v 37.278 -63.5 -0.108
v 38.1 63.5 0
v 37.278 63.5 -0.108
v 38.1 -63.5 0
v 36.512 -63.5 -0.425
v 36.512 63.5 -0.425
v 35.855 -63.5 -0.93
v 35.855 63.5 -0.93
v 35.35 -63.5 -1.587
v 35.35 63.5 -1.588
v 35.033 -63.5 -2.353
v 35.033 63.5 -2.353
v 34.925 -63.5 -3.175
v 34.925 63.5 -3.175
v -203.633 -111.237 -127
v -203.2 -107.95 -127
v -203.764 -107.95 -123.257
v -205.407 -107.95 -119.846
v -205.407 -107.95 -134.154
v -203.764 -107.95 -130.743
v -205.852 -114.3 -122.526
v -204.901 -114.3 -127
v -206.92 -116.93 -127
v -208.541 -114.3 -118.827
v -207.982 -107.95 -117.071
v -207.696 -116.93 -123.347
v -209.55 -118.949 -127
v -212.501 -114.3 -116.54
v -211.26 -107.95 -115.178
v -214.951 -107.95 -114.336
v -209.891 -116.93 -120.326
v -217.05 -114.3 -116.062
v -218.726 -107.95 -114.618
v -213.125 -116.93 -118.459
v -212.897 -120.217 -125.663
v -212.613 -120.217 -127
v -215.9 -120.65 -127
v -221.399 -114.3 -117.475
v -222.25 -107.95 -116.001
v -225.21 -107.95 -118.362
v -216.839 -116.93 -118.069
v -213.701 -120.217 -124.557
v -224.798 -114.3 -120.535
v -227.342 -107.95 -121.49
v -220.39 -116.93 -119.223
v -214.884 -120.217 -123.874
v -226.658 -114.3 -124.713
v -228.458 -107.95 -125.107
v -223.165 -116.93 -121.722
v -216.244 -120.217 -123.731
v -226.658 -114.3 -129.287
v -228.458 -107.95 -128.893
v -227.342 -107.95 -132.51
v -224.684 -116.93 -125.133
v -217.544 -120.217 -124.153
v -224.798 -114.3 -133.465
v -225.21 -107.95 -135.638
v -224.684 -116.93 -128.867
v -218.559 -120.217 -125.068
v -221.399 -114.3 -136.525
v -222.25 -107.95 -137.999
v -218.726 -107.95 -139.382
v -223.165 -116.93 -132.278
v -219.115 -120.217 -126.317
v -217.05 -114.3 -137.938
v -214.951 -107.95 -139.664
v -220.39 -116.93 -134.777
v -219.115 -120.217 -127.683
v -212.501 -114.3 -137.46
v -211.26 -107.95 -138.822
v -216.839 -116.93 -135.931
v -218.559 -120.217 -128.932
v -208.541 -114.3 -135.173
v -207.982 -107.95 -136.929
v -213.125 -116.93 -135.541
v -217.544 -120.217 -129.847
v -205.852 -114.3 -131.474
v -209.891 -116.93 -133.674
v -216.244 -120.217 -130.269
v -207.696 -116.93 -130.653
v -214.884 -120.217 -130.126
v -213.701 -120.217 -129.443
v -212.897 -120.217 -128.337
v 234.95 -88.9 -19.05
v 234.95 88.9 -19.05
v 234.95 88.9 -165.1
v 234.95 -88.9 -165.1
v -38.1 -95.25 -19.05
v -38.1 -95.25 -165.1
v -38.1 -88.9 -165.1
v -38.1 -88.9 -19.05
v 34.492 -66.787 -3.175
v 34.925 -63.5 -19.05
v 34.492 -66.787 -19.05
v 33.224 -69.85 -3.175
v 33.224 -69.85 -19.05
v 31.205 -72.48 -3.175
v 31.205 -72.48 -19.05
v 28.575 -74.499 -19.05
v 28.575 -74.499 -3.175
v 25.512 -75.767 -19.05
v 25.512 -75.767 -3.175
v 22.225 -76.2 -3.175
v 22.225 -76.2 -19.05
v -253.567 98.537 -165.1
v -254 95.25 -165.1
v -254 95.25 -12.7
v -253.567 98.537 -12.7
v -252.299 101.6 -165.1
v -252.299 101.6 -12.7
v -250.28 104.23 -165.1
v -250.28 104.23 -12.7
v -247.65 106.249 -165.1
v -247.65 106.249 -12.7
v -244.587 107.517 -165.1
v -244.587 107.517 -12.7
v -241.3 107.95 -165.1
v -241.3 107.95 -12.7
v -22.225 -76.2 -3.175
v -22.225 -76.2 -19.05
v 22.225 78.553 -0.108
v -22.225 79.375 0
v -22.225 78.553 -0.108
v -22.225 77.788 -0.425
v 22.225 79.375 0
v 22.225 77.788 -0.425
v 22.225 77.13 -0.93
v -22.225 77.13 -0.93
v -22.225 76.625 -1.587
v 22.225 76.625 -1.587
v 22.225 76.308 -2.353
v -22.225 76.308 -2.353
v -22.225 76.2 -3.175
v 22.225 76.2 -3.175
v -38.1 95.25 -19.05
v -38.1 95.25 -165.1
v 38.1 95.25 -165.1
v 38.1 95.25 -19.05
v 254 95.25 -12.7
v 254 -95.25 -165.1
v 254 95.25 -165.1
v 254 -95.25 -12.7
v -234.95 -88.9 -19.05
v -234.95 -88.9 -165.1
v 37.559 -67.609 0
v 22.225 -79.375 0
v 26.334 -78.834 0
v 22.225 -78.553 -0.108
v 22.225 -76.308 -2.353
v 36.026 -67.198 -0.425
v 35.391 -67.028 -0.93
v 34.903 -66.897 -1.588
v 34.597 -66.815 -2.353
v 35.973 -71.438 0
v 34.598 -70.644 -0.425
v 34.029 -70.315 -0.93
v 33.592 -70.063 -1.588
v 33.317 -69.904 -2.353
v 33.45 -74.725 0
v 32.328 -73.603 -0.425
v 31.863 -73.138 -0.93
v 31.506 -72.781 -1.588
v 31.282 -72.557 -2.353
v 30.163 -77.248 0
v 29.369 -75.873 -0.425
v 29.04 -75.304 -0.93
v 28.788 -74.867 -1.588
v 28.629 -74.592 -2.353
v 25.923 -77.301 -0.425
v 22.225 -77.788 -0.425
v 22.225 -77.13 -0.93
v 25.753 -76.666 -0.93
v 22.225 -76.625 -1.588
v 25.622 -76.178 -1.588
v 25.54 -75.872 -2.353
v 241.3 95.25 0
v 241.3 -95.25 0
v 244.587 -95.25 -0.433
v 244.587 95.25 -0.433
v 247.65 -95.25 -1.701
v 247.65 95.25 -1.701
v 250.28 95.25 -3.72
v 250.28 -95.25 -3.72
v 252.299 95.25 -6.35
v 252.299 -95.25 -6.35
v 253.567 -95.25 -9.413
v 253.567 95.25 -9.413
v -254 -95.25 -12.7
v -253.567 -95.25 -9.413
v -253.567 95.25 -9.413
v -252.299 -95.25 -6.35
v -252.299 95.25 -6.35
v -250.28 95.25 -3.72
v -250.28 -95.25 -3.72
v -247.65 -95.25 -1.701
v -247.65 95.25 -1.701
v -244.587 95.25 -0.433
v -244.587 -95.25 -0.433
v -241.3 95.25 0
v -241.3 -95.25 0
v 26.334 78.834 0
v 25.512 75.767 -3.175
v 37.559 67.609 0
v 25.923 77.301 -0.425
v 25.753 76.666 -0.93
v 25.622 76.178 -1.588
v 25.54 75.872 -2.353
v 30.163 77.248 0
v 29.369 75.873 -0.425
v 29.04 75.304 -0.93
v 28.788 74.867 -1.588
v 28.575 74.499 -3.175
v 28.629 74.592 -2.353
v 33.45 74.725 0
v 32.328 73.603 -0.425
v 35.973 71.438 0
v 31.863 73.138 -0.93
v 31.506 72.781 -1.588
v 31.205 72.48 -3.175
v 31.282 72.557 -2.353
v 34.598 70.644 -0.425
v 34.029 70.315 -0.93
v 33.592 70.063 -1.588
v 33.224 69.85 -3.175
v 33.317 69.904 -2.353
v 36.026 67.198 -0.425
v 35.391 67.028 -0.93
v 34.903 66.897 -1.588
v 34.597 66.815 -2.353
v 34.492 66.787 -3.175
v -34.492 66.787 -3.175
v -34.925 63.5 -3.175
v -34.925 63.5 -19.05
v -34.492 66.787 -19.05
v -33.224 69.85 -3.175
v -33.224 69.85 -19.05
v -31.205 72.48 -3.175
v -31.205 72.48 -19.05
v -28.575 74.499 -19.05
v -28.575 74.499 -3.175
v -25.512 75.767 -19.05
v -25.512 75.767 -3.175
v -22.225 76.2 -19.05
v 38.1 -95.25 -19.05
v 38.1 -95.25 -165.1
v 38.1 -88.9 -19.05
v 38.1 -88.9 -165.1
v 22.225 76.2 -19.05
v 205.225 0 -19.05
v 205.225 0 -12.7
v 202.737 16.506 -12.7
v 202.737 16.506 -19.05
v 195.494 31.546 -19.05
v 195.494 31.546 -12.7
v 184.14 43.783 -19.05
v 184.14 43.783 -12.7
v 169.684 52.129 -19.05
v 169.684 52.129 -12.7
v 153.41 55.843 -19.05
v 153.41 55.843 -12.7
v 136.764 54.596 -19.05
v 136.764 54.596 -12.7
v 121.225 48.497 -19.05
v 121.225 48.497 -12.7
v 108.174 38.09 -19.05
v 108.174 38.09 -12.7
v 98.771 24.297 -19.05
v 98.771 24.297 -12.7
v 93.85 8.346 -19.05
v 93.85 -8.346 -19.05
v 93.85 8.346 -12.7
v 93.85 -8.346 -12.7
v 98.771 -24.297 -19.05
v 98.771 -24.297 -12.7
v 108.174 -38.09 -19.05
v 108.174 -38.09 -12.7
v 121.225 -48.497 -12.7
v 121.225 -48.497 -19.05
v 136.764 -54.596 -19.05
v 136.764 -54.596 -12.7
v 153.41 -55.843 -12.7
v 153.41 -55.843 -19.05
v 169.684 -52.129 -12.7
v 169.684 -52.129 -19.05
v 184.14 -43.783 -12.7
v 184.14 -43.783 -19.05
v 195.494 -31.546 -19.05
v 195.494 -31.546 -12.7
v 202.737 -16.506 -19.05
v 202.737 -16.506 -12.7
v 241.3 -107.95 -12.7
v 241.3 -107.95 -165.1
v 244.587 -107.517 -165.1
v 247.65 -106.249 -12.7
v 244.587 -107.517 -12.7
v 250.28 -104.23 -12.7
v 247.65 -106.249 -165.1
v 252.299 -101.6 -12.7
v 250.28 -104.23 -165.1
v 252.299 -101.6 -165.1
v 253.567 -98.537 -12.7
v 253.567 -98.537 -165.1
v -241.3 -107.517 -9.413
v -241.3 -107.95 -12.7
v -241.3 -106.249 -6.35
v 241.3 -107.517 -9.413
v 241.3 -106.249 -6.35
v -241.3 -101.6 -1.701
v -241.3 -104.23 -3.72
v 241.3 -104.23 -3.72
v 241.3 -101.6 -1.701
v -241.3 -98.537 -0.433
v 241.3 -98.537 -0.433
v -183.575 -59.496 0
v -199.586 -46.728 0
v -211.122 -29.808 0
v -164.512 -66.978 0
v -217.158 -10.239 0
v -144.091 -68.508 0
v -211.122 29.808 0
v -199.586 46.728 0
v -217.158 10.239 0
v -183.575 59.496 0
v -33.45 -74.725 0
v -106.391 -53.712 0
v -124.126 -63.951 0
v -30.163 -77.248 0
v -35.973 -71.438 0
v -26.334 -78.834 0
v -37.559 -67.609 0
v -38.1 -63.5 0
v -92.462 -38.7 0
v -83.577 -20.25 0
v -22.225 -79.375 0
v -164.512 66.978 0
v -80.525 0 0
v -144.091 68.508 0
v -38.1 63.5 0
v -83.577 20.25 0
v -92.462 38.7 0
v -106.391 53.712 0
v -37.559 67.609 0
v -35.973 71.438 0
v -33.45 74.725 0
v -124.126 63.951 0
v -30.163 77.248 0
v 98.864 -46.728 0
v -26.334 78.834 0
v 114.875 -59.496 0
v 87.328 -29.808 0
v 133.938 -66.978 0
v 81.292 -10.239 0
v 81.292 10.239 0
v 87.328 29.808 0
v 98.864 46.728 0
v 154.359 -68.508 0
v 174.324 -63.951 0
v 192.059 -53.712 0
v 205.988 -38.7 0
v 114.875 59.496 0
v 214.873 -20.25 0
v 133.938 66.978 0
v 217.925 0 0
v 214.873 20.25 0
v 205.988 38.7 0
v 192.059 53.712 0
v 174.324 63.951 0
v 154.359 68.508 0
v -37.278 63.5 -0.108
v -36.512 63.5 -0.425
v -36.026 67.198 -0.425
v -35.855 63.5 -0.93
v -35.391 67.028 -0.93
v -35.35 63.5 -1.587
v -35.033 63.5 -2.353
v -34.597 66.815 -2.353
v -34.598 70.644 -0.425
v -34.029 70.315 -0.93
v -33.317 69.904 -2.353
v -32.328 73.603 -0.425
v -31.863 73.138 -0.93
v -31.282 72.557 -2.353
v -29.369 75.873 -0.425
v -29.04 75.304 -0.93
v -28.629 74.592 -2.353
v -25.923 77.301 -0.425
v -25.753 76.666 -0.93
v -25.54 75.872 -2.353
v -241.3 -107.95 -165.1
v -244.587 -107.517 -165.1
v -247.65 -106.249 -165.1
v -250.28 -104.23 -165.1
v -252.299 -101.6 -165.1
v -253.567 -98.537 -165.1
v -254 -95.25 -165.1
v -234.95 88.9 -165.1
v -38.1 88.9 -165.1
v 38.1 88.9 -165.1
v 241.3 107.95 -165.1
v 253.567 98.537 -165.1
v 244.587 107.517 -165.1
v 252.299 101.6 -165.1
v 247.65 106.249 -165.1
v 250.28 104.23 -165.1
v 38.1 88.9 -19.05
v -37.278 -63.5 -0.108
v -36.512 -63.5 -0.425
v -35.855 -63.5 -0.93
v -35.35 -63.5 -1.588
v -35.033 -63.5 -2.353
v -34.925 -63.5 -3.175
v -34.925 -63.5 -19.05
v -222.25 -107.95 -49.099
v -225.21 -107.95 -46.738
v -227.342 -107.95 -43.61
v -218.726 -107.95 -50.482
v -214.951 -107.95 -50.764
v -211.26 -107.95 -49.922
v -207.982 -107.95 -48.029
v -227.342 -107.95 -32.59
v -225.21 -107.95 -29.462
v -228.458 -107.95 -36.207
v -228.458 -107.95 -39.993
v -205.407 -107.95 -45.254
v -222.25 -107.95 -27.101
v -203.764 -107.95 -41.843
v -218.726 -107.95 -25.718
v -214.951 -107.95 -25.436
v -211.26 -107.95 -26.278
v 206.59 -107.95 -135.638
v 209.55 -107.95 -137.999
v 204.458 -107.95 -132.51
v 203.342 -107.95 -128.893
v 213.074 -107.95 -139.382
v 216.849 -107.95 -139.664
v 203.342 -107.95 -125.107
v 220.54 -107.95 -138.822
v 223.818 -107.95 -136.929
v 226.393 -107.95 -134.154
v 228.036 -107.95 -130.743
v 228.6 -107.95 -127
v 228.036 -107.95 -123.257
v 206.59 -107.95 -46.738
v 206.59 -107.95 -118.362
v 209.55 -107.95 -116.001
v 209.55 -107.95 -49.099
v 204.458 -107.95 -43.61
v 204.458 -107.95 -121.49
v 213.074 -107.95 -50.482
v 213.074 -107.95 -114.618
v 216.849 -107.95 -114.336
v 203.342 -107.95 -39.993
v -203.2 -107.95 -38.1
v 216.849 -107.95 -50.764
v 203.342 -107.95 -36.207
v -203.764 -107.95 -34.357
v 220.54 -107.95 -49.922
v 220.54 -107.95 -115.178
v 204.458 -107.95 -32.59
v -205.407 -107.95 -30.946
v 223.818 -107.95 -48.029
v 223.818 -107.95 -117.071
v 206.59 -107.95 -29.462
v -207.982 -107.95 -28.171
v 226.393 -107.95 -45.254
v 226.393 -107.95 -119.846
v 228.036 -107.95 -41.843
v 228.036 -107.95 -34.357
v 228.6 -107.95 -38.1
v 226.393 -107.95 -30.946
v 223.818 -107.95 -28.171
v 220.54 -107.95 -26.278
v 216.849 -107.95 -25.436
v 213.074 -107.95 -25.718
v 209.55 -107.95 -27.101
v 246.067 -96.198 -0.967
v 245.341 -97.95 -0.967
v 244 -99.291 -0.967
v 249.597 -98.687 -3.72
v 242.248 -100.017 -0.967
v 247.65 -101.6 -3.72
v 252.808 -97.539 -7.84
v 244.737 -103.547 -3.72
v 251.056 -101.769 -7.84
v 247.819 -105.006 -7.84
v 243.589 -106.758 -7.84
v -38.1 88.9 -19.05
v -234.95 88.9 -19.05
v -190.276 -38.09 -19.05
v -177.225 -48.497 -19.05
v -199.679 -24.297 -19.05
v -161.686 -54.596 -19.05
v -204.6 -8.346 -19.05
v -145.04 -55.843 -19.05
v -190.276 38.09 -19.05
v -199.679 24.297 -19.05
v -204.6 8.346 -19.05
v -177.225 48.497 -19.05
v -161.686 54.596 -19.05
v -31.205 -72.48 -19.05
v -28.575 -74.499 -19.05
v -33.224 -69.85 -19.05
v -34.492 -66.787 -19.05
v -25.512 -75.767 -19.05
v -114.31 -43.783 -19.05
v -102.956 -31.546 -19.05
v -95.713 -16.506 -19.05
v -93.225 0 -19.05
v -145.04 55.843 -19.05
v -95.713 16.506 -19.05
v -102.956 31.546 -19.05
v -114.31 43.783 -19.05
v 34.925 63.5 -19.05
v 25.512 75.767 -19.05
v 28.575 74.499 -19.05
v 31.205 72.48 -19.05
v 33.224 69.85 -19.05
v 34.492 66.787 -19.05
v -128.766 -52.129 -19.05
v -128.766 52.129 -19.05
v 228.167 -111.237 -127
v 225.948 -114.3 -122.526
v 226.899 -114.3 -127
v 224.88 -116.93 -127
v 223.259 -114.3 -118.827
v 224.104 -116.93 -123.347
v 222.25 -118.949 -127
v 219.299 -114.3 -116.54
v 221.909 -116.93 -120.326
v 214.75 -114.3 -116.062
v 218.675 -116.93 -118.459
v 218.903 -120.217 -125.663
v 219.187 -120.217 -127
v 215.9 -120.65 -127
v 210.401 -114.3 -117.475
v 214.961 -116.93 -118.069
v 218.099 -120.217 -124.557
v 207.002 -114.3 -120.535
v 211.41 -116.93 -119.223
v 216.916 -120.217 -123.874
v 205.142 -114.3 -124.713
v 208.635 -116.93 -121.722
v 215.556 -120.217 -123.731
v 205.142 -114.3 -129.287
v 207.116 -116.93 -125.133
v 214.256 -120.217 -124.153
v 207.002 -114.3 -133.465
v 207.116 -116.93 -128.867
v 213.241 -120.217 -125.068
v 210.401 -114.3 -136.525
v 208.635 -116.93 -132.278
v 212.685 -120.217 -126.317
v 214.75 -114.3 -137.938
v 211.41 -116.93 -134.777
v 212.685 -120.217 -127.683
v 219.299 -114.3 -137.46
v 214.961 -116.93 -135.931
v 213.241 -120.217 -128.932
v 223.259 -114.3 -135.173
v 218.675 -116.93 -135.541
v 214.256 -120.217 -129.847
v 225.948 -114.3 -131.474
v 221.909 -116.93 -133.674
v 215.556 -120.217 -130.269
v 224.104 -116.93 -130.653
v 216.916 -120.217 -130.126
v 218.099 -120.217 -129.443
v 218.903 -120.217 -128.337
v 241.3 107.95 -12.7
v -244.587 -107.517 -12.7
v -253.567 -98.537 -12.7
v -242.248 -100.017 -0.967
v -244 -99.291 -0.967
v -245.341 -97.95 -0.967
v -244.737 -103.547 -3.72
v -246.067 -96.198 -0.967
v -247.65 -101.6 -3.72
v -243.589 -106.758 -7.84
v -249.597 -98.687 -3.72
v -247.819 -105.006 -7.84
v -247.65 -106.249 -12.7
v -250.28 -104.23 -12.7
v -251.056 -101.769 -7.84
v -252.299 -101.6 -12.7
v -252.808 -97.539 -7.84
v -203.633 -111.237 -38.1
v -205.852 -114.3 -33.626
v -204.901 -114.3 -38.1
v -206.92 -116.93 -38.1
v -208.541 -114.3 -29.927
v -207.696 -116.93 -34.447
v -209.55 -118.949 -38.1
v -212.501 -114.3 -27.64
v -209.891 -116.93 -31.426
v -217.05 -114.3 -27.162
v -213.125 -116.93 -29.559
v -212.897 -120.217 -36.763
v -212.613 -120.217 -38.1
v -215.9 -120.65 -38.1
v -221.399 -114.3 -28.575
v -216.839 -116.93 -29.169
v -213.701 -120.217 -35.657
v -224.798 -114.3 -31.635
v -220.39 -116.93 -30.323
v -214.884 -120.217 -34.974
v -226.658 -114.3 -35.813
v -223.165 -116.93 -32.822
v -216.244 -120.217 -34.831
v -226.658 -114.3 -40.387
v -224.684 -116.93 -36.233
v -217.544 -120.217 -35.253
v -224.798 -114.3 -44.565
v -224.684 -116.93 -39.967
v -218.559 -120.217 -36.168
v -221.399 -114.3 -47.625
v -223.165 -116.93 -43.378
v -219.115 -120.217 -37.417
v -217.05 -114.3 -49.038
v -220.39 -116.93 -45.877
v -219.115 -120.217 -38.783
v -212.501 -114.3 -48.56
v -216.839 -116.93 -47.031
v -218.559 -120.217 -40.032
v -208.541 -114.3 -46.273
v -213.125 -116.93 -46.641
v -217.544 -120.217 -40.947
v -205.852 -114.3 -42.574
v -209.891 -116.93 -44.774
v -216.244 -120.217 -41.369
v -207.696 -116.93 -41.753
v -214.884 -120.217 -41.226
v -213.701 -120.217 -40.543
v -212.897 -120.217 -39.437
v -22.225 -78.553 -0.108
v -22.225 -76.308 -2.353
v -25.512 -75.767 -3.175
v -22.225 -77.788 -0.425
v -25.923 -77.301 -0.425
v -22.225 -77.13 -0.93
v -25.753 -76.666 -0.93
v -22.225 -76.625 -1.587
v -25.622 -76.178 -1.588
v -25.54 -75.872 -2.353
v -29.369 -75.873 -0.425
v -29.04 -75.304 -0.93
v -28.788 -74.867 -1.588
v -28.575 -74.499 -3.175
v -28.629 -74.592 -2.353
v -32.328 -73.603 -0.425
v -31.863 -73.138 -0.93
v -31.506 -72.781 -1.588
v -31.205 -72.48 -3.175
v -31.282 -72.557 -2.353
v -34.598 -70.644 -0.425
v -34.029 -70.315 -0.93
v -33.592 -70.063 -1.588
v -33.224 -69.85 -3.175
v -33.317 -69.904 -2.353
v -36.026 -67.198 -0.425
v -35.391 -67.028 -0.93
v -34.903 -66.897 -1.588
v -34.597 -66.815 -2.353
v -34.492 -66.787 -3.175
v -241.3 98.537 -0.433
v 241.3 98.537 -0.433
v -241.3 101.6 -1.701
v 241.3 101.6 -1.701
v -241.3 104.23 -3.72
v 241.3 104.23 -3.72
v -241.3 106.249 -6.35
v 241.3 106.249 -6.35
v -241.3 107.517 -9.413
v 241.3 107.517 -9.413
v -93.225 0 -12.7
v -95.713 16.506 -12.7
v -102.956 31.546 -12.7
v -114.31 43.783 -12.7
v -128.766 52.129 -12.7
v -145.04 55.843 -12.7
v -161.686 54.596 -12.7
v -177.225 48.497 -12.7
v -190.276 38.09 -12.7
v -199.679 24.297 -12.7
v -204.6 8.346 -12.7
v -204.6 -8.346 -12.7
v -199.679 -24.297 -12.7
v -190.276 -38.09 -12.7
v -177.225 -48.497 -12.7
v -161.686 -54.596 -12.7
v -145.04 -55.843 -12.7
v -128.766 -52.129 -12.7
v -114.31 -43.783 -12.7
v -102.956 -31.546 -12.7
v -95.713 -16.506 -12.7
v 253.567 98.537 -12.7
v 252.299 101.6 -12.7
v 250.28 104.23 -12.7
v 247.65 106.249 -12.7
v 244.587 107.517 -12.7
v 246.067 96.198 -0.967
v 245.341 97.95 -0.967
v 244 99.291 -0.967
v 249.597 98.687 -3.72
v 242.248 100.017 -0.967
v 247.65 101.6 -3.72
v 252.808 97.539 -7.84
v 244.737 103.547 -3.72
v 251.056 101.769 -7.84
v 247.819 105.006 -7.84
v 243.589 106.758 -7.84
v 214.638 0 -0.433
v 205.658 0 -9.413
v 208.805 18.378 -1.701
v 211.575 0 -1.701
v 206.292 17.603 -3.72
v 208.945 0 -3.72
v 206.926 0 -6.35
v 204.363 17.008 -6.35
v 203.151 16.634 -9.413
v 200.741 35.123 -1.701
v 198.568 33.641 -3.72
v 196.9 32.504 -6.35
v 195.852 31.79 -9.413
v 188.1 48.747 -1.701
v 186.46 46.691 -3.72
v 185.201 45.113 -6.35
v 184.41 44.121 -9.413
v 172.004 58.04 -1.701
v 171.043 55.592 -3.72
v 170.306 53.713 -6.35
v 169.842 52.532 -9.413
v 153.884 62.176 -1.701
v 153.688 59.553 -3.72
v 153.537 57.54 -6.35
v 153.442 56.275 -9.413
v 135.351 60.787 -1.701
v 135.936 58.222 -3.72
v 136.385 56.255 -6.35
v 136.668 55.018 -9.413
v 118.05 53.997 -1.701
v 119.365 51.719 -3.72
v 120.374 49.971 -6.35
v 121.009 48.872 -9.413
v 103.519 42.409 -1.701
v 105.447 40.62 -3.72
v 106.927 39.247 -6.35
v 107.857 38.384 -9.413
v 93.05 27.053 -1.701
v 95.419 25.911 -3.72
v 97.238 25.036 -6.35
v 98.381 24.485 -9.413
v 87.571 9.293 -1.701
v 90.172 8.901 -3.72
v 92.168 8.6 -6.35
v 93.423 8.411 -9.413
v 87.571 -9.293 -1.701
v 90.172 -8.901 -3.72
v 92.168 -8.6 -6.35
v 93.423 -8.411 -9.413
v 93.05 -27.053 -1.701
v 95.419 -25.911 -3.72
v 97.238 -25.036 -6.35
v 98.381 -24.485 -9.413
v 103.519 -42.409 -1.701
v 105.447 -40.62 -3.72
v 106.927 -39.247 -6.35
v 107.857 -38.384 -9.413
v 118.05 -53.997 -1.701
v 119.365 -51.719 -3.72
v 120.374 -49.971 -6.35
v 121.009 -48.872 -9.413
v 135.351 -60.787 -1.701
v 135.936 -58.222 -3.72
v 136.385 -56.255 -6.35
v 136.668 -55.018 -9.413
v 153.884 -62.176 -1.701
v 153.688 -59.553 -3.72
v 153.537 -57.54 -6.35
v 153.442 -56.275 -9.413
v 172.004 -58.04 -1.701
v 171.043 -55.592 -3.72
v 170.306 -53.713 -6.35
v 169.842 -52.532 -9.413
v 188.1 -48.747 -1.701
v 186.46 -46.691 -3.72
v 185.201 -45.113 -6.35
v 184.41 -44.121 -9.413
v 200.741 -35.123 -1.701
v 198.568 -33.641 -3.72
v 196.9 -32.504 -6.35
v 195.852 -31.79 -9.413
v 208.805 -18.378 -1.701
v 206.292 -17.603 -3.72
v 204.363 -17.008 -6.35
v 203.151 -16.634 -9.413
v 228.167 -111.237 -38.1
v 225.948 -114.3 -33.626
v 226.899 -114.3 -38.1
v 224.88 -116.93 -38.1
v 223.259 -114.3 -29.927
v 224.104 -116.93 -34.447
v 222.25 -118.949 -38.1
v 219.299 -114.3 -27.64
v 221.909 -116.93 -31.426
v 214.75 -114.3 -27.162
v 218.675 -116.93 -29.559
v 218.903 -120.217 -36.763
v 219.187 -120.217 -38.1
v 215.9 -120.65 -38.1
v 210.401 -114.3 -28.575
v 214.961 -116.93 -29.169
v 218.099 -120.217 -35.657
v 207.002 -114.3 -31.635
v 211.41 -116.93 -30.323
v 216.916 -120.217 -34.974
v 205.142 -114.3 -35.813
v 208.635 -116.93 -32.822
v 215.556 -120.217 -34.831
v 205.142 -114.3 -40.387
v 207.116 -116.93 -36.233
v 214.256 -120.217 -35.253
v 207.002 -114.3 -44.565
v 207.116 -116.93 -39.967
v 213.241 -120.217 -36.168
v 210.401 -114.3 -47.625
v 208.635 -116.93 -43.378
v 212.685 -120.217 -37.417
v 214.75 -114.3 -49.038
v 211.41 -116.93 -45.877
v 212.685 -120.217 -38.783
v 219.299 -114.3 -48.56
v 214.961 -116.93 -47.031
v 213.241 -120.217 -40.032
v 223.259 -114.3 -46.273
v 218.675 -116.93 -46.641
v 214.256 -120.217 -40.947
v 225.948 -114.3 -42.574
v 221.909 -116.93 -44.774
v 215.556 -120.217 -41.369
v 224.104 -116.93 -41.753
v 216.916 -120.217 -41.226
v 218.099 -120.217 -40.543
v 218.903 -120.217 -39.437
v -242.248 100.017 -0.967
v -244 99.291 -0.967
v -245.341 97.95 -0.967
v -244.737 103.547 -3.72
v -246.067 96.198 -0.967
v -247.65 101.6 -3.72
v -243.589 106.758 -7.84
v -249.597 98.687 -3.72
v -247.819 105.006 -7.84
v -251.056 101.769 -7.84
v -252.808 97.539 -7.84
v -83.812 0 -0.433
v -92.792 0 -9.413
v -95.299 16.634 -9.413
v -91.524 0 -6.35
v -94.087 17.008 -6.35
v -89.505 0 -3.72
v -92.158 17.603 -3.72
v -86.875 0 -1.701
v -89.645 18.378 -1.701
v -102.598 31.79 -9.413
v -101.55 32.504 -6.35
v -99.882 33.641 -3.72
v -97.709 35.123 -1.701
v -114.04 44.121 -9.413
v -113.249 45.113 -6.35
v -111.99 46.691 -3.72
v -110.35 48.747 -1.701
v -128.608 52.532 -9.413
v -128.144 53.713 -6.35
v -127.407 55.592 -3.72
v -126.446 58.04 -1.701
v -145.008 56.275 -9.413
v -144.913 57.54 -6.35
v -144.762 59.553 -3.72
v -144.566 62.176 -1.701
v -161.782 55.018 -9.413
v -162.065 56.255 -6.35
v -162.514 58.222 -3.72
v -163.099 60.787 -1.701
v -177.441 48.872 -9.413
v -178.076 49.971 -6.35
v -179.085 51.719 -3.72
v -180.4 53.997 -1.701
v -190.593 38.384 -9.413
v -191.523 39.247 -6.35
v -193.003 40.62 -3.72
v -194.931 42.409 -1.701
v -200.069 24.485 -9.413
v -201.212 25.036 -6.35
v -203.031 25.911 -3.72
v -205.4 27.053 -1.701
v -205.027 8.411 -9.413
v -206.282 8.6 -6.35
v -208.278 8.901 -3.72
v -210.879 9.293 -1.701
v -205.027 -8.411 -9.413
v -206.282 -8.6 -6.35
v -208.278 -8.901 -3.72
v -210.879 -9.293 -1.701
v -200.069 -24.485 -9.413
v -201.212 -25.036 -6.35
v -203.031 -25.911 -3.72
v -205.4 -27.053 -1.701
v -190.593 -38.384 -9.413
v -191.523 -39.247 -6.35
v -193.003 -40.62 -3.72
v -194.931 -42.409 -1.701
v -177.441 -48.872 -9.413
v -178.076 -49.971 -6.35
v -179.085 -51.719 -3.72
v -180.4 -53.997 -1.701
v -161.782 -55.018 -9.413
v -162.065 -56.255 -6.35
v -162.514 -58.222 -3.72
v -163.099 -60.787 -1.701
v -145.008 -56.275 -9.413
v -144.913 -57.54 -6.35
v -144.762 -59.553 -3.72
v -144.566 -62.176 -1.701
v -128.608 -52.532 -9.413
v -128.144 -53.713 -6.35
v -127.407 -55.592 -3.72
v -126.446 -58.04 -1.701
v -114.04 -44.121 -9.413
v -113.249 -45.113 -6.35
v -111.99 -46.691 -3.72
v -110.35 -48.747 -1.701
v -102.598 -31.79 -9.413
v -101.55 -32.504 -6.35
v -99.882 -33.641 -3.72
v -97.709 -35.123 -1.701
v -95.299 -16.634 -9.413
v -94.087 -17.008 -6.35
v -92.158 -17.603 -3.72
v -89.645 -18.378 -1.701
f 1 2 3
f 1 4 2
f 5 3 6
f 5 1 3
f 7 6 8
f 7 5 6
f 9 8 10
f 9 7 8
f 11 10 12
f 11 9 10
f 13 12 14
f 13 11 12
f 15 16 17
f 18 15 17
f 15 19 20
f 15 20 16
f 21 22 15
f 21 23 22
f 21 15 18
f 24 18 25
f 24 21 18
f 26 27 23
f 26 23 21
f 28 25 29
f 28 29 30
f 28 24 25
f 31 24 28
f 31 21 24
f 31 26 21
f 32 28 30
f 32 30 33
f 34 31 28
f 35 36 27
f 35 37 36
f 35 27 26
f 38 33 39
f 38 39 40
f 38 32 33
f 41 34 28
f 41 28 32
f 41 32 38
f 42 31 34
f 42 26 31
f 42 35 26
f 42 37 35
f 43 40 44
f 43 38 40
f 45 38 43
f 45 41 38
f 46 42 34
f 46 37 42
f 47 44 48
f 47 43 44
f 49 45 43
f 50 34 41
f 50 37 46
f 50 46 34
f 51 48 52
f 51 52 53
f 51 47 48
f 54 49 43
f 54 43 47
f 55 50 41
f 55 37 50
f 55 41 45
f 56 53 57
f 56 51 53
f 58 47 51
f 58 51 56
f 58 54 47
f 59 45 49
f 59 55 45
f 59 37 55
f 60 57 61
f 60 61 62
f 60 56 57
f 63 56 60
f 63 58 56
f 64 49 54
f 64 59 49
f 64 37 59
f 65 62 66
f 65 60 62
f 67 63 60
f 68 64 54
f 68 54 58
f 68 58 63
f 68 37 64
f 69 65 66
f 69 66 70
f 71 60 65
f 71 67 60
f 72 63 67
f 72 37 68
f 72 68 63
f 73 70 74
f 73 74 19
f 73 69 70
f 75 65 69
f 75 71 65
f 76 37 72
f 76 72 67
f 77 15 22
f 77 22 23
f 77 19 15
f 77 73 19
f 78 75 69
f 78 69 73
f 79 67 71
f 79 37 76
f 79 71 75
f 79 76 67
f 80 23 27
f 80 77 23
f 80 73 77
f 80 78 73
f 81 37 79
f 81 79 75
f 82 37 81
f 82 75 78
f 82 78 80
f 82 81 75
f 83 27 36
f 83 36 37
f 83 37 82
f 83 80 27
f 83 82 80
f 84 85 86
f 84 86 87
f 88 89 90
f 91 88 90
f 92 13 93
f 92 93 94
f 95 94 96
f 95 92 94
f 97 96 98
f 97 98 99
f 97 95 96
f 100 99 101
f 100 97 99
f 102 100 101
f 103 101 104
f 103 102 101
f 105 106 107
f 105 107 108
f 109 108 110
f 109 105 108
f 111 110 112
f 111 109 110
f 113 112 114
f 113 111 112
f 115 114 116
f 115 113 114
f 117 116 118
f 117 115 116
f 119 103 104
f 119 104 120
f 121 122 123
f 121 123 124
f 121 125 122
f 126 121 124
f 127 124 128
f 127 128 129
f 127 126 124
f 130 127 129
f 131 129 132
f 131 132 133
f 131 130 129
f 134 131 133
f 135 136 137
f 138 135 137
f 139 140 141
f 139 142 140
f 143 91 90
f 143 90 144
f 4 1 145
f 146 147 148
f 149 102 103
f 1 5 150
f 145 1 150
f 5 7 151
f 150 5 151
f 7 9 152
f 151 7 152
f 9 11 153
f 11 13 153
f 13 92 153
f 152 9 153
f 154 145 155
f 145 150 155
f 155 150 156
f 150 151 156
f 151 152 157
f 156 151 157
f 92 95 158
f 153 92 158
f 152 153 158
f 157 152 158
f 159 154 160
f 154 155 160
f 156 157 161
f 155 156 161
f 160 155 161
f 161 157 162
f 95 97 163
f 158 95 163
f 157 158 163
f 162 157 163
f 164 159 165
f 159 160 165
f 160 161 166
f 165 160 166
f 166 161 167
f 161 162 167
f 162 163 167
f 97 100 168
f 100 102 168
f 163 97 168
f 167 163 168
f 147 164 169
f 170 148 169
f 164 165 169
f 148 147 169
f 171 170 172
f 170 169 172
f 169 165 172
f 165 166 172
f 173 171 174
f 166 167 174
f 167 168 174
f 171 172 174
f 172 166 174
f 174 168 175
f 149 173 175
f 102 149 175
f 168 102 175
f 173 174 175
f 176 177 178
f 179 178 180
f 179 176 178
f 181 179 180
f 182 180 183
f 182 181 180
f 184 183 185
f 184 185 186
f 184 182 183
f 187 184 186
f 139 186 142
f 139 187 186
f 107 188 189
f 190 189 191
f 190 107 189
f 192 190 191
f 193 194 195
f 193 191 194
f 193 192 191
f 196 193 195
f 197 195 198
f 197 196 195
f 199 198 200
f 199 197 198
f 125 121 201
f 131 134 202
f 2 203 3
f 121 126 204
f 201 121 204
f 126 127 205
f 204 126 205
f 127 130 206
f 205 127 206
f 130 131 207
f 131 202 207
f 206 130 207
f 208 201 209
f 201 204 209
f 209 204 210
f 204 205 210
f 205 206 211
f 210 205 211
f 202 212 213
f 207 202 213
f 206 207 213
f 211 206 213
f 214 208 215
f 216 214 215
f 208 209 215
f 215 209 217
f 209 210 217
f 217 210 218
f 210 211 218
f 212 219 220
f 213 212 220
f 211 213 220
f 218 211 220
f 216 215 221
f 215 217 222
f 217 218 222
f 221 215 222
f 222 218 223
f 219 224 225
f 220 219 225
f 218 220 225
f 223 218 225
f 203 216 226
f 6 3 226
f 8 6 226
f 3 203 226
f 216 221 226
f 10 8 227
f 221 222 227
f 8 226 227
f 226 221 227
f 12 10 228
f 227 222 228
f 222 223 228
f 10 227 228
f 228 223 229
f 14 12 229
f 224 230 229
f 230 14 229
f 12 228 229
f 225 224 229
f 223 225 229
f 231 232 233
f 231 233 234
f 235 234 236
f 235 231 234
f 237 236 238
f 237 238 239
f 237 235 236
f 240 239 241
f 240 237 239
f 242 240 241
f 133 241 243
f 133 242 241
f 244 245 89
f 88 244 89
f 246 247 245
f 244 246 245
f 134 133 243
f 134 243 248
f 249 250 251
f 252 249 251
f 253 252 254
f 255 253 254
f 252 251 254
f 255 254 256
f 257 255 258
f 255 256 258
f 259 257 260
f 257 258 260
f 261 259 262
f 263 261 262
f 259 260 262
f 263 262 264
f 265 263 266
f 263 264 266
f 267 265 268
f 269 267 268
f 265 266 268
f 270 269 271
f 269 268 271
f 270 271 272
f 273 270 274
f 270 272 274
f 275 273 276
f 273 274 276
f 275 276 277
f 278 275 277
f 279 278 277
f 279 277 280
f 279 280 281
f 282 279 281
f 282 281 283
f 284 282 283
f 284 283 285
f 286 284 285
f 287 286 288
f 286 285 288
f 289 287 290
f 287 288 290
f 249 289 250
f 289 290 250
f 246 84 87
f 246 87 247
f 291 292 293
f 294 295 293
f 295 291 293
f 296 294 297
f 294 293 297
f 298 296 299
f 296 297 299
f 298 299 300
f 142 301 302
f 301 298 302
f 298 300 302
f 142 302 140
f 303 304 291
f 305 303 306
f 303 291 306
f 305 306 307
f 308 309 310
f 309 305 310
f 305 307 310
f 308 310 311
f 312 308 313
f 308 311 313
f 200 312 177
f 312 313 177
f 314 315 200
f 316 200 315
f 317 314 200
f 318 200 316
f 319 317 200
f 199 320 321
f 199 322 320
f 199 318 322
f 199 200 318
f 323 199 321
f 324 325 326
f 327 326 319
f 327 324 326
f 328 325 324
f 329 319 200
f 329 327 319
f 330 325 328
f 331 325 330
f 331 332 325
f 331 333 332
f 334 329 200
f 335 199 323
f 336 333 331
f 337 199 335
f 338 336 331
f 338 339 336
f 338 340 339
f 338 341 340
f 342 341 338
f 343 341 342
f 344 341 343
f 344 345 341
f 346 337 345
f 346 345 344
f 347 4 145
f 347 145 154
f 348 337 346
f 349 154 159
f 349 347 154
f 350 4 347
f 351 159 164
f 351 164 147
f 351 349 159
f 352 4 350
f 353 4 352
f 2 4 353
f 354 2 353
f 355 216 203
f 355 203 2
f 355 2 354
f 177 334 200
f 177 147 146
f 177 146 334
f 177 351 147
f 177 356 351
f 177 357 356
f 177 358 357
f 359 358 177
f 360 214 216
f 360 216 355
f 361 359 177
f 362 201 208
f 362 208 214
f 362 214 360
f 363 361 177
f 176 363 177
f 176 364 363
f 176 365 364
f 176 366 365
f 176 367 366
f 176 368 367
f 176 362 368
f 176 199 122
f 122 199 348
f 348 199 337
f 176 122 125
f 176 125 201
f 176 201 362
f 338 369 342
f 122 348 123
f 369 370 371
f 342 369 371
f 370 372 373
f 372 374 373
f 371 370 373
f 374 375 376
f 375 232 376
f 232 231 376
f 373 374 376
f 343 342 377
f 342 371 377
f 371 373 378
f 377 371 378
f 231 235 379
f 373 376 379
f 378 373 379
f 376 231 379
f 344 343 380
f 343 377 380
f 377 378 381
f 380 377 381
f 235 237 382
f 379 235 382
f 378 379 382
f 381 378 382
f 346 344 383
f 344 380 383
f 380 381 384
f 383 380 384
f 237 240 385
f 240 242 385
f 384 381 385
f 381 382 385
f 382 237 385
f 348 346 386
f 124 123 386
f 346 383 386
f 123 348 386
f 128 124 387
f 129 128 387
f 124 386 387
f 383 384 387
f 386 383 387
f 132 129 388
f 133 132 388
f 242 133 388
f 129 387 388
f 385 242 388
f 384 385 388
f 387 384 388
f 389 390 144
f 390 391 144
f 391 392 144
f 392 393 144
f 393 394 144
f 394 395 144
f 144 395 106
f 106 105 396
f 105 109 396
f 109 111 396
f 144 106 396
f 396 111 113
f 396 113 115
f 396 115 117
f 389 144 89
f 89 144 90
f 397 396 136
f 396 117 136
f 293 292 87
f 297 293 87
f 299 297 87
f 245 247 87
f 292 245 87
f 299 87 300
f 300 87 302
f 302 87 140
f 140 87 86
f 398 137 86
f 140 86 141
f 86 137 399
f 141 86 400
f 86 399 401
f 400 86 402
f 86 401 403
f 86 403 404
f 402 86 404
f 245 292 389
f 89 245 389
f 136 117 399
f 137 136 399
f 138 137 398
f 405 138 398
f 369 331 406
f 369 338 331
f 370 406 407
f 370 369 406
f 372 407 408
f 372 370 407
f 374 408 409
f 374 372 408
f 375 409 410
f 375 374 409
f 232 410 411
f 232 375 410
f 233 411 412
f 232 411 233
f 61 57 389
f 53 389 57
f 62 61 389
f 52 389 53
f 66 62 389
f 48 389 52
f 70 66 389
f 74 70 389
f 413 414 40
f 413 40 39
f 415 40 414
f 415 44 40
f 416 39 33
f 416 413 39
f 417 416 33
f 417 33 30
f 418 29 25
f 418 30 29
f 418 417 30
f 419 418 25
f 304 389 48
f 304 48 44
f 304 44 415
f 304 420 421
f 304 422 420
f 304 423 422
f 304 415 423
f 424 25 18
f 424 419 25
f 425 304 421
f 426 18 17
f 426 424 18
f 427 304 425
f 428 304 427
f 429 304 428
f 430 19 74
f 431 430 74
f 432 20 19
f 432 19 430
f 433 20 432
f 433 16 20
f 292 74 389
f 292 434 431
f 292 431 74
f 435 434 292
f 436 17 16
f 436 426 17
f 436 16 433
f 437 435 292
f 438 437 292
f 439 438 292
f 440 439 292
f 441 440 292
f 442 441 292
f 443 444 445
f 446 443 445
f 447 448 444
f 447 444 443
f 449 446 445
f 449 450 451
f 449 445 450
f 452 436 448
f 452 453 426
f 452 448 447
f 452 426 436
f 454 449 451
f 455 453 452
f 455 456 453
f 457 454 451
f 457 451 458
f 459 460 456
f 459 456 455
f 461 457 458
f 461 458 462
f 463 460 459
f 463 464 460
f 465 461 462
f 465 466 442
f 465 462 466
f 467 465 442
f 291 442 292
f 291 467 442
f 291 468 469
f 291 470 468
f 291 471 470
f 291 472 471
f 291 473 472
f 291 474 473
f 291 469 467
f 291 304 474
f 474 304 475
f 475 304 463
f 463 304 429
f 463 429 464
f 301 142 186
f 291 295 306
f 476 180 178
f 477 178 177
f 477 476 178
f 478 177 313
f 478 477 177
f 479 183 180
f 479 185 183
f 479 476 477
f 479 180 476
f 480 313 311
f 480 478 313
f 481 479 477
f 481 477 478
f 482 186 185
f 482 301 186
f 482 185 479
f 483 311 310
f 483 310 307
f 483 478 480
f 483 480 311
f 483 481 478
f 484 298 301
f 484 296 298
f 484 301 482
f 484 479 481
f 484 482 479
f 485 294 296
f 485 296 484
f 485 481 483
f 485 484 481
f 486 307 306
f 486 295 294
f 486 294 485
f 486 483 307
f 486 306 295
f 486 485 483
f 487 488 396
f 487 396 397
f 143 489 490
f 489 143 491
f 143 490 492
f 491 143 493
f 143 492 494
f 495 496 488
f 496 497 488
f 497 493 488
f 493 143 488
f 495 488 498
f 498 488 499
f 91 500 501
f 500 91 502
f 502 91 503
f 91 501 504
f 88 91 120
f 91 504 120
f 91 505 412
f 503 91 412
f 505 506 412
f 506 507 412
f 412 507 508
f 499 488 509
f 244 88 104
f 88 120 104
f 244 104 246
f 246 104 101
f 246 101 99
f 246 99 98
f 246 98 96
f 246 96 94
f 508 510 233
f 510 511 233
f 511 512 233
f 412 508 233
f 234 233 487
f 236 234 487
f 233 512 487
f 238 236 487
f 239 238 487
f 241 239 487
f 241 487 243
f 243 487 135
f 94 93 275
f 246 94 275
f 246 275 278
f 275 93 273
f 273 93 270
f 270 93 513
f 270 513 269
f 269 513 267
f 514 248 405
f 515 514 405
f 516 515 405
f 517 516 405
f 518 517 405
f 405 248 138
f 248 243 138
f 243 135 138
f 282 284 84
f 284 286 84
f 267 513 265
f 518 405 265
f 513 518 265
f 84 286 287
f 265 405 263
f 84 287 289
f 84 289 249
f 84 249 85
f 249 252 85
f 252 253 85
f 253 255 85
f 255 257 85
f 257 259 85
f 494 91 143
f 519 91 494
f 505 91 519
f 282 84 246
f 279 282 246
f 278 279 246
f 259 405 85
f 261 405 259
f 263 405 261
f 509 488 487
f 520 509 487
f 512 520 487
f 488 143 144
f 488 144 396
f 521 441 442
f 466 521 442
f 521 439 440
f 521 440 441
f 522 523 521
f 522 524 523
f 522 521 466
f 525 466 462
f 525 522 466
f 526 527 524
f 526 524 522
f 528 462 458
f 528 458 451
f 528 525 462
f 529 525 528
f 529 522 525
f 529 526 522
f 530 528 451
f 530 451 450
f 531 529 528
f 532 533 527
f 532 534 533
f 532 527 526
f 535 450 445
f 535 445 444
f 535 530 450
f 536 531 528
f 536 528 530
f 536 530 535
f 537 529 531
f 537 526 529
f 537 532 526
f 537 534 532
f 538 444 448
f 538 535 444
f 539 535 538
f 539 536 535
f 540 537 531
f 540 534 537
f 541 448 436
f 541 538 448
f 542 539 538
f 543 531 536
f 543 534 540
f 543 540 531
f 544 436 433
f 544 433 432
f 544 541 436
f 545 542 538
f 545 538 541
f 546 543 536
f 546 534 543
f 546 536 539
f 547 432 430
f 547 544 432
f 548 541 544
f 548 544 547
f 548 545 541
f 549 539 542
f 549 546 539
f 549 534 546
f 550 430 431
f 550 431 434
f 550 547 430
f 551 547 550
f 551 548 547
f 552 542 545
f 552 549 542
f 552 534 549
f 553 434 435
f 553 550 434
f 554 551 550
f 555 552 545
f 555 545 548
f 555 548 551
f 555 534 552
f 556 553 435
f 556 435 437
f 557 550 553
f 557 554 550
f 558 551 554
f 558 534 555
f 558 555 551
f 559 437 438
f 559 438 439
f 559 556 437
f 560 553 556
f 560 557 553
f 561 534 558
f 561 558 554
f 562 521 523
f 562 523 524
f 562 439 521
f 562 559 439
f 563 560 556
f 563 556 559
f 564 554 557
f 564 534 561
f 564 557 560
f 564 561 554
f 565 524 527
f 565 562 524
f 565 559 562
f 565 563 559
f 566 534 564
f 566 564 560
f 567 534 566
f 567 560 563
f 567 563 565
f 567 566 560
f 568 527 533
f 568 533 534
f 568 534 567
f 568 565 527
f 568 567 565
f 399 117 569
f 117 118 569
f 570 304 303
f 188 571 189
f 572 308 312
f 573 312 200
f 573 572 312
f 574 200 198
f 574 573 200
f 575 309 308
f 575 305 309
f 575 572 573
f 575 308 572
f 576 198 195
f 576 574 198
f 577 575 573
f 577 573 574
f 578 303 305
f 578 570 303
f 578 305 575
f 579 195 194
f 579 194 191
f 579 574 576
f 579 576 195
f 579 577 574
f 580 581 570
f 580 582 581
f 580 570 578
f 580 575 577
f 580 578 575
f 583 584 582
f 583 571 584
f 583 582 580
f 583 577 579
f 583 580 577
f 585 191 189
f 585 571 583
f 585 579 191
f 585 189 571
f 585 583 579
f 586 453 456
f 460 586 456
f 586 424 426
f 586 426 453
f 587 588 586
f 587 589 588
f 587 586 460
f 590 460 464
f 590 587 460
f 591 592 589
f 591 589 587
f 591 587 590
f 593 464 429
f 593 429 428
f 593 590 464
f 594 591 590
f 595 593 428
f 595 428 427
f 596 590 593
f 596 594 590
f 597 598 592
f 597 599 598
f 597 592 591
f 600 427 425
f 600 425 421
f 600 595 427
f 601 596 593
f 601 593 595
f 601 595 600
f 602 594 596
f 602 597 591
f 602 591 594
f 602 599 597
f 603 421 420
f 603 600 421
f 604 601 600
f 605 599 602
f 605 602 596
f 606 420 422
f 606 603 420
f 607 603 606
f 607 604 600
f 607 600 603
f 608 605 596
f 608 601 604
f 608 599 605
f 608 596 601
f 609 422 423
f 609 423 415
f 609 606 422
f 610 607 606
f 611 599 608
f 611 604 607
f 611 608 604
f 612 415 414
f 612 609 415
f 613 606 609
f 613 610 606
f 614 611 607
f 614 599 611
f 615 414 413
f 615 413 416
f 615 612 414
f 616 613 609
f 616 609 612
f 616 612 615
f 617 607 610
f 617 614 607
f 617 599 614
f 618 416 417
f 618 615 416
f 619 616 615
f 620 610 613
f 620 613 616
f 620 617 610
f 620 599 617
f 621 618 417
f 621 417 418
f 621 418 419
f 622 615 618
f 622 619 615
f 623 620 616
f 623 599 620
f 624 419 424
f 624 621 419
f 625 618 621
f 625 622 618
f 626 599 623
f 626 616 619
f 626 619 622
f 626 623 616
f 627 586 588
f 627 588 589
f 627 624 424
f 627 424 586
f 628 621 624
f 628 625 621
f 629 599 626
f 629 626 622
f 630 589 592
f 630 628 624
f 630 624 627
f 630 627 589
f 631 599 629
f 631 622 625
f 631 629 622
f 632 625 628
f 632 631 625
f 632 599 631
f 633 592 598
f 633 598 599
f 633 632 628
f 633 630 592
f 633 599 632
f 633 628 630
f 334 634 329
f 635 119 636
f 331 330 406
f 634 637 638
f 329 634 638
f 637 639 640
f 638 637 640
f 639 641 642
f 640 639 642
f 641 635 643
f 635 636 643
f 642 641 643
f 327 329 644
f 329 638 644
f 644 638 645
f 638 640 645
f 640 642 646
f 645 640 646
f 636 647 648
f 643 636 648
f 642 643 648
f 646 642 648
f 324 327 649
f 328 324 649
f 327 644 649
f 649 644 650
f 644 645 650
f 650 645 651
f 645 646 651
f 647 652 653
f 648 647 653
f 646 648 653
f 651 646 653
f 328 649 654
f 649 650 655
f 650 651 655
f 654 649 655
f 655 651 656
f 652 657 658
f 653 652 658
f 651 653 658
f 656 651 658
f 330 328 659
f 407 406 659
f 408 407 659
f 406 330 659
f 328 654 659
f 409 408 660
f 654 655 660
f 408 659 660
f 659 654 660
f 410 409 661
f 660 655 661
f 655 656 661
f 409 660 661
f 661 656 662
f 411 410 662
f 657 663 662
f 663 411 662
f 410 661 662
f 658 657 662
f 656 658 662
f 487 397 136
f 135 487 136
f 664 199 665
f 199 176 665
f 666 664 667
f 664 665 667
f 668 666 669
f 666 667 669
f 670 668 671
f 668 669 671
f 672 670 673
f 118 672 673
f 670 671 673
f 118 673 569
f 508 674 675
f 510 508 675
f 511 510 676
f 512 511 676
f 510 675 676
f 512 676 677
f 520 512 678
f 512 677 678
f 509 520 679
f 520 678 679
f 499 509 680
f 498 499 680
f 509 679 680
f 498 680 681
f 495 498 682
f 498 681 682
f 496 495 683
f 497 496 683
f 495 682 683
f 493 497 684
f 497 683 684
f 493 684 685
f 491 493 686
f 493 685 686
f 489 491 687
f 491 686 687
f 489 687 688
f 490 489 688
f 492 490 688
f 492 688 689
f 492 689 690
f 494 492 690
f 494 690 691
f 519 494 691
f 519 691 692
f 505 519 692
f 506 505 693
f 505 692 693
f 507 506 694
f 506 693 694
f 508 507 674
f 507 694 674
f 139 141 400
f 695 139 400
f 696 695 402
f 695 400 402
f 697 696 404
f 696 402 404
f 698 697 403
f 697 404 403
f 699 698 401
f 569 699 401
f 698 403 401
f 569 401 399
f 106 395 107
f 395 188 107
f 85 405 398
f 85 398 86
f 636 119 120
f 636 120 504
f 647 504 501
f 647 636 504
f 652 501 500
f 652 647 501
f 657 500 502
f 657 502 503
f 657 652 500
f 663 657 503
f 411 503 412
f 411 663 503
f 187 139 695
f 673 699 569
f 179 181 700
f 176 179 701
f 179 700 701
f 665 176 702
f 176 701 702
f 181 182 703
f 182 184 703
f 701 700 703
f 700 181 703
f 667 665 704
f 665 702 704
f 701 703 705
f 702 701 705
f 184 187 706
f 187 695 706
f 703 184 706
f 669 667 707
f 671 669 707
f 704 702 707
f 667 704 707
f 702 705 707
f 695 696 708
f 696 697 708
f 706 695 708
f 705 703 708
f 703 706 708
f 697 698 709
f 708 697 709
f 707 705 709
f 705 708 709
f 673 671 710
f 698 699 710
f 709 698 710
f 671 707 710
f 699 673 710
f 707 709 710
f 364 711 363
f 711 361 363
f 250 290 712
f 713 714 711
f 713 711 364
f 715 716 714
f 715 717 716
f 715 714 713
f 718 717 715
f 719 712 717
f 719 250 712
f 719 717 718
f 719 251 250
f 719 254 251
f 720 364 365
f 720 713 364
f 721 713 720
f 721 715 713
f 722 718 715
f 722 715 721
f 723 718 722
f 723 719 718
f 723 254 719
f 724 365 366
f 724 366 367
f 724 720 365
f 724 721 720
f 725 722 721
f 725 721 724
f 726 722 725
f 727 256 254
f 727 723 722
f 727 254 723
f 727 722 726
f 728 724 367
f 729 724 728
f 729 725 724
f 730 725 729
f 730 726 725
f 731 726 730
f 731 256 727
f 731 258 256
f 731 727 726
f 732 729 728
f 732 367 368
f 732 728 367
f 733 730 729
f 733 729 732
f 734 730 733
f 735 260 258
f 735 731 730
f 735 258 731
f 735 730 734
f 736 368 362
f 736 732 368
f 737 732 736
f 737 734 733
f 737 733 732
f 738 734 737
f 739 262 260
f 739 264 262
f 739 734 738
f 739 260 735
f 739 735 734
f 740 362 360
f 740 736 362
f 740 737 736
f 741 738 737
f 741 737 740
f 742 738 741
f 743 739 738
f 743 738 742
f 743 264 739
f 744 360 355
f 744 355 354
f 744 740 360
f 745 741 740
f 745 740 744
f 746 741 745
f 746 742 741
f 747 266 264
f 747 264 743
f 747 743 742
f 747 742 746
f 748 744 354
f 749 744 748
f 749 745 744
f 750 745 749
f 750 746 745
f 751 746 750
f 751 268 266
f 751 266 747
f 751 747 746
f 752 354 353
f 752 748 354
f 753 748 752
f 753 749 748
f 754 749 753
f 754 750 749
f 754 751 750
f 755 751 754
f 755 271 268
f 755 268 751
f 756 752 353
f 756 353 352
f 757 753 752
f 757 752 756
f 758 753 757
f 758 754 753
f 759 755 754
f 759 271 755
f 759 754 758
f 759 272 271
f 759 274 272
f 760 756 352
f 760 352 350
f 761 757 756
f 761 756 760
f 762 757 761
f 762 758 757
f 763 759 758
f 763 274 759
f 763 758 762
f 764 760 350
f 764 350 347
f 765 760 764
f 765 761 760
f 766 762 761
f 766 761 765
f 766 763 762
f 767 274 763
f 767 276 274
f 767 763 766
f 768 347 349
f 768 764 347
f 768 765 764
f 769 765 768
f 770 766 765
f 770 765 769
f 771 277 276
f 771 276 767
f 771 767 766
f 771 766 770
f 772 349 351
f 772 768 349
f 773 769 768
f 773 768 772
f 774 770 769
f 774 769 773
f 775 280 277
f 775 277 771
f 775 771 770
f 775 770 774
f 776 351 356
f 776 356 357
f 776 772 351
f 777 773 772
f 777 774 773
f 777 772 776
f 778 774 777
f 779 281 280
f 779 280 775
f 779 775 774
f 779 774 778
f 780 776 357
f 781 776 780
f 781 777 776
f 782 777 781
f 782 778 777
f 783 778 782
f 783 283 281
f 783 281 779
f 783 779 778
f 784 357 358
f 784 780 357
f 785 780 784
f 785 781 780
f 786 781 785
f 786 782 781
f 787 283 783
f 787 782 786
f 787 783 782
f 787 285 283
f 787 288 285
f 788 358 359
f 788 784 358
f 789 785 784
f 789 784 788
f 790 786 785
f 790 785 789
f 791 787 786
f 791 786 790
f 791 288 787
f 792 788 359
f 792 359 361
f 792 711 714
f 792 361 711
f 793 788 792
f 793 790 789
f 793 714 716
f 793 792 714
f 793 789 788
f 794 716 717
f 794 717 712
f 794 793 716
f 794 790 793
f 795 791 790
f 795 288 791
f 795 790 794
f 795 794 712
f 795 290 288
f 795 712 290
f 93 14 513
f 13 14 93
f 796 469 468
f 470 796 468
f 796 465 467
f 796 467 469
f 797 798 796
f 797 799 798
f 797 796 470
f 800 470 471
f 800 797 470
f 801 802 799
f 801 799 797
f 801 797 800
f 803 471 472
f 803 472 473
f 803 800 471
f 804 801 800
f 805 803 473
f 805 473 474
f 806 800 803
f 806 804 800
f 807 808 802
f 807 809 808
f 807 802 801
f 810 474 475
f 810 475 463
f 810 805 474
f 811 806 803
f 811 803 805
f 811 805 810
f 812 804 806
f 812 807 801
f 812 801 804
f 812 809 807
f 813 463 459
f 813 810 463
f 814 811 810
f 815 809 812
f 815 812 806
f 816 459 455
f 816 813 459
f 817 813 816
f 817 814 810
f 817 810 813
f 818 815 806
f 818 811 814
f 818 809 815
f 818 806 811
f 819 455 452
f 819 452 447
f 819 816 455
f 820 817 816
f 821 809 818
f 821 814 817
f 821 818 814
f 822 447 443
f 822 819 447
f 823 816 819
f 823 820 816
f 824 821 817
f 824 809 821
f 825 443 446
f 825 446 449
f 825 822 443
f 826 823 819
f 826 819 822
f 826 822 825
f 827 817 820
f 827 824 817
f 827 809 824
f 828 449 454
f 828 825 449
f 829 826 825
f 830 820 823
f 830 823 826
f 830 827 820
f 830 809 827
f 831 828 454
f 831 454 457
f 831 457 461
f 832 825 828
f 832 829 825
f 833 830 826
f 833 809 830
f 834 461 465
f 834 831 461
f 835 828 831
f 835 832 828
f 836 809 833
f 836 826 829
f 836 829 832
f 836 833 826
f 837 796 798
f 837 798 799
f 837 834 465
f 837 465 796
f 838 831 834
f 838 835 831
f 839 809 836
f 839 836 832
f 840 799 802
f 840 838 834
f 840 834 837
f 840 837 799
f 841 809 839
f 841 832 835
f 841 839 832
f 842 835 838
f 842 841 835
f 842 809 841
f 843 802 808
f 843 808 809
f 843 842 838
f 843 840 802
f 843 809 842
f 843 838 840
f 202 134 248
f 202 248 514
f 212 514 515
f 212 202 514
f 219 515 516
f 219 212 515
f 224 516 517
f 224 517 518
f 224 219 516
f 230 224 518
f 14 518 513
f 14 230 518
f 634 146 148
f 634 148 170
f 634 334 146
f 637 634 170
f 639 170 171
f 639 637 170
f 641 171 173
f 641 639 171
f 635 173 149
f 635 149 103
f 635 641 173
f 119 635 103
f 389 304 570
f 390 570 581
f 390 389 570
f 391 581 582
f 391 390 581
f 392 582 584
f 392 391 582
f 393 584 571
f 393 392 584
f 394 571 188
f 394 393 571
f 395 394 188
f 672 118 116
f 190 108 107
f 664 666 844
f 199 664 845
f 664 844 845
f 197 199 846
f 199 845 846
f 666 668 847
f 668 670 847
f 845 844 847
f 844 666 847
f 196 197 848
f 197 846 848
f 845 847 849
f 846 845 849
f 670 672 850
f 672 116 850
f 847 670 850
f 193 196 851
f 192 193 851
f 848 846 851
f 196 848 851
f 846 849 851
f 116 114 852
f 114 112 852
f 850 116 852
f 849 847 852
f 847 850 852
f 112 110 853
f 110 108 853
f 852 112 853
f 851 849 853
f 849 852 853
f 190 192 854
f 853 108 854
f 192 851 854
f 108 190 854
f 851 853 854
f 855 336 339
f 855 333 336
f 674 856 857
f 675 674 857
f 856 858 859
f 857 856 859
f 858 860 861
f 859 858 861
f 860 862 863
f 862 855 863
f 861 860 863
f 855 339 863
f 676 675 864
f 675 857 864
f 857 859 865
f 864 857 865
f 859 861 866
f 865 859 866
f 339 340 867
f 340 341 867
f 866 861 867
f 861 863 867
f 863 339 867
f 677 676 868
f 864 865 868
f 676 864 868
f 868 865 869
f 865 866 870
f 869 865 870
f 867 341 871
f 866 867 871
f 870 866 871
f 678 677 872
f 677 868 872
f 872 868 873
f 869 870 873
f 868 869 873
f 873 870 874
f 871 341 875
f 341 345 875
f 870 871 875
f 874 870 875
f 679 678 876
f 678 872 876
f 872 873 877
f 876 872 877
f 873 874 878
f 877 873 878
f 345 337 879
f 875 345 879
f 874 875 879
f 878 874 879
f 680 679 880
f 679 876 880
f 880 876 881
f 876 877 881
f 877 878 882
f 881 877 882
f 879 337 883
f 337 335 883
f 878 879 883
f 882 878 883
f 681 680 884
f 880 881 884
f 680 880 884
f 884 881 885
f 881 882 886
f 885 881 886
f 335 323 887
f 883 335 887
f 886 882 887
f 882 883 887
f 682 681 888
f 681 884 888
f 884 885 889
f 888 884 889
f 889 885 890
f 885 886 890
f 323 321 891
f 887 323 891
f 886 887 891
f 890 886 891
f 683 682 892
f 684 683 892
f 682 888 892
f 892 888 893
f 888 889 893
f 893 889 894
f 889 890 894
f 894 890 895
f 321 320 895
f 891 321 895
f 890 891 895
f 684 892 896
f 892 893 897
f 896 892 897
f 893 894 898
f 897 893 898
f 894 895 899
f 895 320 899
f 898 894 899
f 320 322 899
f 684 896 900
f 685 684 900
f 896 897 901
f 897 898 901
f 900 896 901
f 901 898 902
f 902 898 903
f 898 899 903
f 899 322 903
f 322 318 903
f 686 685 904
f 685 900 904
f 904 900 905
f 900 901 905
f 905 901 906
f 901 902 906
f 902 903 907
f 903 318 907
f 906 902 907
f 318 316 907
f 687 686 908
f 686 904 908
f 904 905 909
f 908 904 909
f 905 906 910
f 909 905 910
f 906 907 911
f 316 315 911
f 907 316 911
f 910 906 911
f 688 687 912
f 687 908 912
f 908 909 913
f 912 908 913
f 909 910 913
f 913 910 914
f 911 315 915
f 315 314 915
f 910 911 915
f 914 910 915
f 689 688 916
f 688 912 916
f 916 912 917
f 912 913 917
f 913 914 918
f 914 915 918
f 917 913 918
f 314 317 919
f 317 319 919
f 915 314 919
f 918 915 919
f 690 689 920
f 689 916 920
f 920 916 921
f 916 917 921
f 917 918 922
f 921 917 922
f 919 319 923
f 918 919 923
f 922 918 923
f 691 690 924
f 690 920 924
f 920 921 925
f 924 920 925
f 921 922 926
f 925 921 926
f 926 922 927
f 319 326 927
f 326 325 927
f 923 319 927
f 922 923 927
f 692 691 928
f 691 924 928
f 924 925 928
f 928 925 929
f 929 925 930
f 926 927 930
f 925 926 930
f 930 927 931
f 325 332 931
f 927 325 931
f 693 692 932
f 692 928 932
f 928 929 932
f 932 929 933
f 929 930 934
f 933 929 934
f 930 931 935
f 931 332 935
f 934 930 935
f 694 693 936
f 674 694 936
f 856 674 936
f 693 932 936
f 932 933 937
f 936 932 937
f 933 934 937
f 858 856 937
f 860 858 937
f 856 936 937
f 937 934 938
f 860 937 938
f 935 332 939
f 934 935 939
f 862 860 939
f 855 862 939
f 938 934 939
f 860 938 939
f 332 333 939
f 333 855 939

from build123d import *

# Parameters (mm, degrees)
F0_W     = 508
F0_H     = 215.9
F1_DEPTH = 165.1
F0_W_2   = 196.85
F0_H_2   = 177.8
F0_R     = 56
F0_W_3   = 76.2
F2_DEPTH = 19.05
F4_DEPTH = 146.05
F5_R     = 12.7
F6_R     = 3.175
F7_R     = 12.7
F8_DEPTH = 12.7
F9_R     = 12.69999
F10_R    = 12.7


# Not quite as in the source:
# - a fillet or chamfer is up to 0.001 mm smaller than in the source, because OpenCascade refuses the exact size


with BuildPart() as f1:
    # F0 (on Top) → F1 (new body)
    with BuildSketch(Plane.XY):
        Rectangle(F0_W, F0_H)
        Polygon((234.95, -88.9), (38.1, -88.9), (-38.1, -88.9), (-234.95, -88.9), (-234.95, 88.9), (-38.1, 88.9), (38.1, 88.9), (234.95, 88.9), align=None, mode=Mode.SUBTRACT)
    extrude(amount=-F1_DEPTH)

    # F0 (on Top) → F2 (join)
    with BuildSketch(Plane.XY):
        with Locations((-136.525, 0)):
            Rectangle(F0_W_2, F0_H_2)
        with Locations((-149.225, 0)):
            Circle(F0_R, mode=Mode.SUBTRACT)
        with Locations((136.525, 0)):
            Rectangle(F0_W_2, F0_H_2)
        with Locations((149.225, 0)):
            Circle(F0_R, mode=Mode.SUBTRACT)
        Rectangle(F0_W_3, F0_H_2)
        with BuildLine():
            ThreePointArc((34.925, -63.5), (31.2052561211, -72.4802561211), (22.225, -76.2))
            Line((22.225, -76.2), (-22.225, -76.2))
            ThreePointArc((-22.225, -76.2), (-31.2052561211, -72.4802561211), (-34.925, -63.5))
            Line((-34.925, -63.5), (-34.925, 63.5))
            ThreePointArc((-34.925, 63.5), (-31.2052561211, 72.4802561211), (-22.225, 76.2))
            Line((-22.225, 76.2), (22.225, 76.2))
            ThreePointArc((22.225, 76.2), (31.2052561211, 72.4802561211), (34.925, 63.5))
            Line((34.925, 63.5), (34.925, -63.5))
        make_face(mode=Mode.SUBTRACT)
    extrude(amount=-F2_DEPTH)

    # F3 (on face) → F4 (cut)
    with BuildSketch(Plane(origin=(0, 0, -165.1), x_dir=(1, 0, 0), z_dir=(0, 0, -1))):
        Polygon((-38.1, -88.9), (0, -88.9), (38.1, -88.9), (234.95, -88.9), (234.95, 88.9), (38.1, 88.9), (0, 88.9), (-38.1, 88.9), (-234.95, 88.9), (-234.95, -88.9), align=None)
        Polygon((38.1, -88.9), (0, -88.9), (-38.1, -88.9), (-38.1, -95.25), (38.1, -95.25), align=None)
        Polygon((0, 88.9), (38.1, 88.9), (38.1, 95.25), (-38.1, 95.25), (-38.1, 88.9), align=None)
    extrude(amount=-F4_DEPTH, mode=Mode.SUBTRACT)

    # F5
    f5_edges = [f1.edges().sort_by_distance(p)[0] for p in [
        (93.225, 0, 0),
        (-205.225, 0, 0),
    ]]
    fillet(f5_edges, radius=F5_R)

    # F6
    f6_edges = [f1.edges().sort_by_distance(p)[0] for p in [
        (0, 76.2, 0),
        (-34.925, 0, 0),
        (-31.205256, 72.480256, 0),
        (31.205256, 72.480256, 0),
        (34.925, 0, 0),
        (31.205256, -72.480256, 0),
        (0, -76.2, 0),
        (-31.205256, -72.480256, 0),
    ]]
    fillet(f6_edges, radius=F6_R)

    # F7 (on face) → F8 (join)
    with BuildSketch(Plane.XZ.offset(107.95)):
        with Locations((-215.9, -38.1)):
            Circle(F7_R)
        with Locations((-215.9, -127)):
            Circle(F7_R)
        with Locations((215.9, -38.1)):
            Circle(F7_R)
        with Locations((215.9, -127)):
            Circle(F7_R)
    extrude(amount=F8_DEPTH)

    # F9 (radius 12.7 in the source; OpenCascade refuses exactly that, so slightly less here)
    f9_edges = [f1.edges().sort_by_distance(p)[0] for p in [
        (-228.6, -120.65, -127),
        (-228.6, -120.65, -38.1),
        (203.2, -120.65, -38.1),
        (203.2, -120.65, -127),
    ]]
    fillet(f9_edges, radius=F9_R)

    # F10
    f10_edges = [f1.edges().sort_by_distance(p)[0] for p in [
        (254, 107.95, -82.55),
        (254, -107.95, -82.55),
        (-254, -107.95, -82.55),
        (-254, 107.95, -82.55),
        (254, 0, 0),
        (0, 107.95, 0),
        (0, -107.95, 0),
        (-254, 0, 0),
    ]]
    fillet(f10_edges, radius=F10_R)


solid = f1.part
